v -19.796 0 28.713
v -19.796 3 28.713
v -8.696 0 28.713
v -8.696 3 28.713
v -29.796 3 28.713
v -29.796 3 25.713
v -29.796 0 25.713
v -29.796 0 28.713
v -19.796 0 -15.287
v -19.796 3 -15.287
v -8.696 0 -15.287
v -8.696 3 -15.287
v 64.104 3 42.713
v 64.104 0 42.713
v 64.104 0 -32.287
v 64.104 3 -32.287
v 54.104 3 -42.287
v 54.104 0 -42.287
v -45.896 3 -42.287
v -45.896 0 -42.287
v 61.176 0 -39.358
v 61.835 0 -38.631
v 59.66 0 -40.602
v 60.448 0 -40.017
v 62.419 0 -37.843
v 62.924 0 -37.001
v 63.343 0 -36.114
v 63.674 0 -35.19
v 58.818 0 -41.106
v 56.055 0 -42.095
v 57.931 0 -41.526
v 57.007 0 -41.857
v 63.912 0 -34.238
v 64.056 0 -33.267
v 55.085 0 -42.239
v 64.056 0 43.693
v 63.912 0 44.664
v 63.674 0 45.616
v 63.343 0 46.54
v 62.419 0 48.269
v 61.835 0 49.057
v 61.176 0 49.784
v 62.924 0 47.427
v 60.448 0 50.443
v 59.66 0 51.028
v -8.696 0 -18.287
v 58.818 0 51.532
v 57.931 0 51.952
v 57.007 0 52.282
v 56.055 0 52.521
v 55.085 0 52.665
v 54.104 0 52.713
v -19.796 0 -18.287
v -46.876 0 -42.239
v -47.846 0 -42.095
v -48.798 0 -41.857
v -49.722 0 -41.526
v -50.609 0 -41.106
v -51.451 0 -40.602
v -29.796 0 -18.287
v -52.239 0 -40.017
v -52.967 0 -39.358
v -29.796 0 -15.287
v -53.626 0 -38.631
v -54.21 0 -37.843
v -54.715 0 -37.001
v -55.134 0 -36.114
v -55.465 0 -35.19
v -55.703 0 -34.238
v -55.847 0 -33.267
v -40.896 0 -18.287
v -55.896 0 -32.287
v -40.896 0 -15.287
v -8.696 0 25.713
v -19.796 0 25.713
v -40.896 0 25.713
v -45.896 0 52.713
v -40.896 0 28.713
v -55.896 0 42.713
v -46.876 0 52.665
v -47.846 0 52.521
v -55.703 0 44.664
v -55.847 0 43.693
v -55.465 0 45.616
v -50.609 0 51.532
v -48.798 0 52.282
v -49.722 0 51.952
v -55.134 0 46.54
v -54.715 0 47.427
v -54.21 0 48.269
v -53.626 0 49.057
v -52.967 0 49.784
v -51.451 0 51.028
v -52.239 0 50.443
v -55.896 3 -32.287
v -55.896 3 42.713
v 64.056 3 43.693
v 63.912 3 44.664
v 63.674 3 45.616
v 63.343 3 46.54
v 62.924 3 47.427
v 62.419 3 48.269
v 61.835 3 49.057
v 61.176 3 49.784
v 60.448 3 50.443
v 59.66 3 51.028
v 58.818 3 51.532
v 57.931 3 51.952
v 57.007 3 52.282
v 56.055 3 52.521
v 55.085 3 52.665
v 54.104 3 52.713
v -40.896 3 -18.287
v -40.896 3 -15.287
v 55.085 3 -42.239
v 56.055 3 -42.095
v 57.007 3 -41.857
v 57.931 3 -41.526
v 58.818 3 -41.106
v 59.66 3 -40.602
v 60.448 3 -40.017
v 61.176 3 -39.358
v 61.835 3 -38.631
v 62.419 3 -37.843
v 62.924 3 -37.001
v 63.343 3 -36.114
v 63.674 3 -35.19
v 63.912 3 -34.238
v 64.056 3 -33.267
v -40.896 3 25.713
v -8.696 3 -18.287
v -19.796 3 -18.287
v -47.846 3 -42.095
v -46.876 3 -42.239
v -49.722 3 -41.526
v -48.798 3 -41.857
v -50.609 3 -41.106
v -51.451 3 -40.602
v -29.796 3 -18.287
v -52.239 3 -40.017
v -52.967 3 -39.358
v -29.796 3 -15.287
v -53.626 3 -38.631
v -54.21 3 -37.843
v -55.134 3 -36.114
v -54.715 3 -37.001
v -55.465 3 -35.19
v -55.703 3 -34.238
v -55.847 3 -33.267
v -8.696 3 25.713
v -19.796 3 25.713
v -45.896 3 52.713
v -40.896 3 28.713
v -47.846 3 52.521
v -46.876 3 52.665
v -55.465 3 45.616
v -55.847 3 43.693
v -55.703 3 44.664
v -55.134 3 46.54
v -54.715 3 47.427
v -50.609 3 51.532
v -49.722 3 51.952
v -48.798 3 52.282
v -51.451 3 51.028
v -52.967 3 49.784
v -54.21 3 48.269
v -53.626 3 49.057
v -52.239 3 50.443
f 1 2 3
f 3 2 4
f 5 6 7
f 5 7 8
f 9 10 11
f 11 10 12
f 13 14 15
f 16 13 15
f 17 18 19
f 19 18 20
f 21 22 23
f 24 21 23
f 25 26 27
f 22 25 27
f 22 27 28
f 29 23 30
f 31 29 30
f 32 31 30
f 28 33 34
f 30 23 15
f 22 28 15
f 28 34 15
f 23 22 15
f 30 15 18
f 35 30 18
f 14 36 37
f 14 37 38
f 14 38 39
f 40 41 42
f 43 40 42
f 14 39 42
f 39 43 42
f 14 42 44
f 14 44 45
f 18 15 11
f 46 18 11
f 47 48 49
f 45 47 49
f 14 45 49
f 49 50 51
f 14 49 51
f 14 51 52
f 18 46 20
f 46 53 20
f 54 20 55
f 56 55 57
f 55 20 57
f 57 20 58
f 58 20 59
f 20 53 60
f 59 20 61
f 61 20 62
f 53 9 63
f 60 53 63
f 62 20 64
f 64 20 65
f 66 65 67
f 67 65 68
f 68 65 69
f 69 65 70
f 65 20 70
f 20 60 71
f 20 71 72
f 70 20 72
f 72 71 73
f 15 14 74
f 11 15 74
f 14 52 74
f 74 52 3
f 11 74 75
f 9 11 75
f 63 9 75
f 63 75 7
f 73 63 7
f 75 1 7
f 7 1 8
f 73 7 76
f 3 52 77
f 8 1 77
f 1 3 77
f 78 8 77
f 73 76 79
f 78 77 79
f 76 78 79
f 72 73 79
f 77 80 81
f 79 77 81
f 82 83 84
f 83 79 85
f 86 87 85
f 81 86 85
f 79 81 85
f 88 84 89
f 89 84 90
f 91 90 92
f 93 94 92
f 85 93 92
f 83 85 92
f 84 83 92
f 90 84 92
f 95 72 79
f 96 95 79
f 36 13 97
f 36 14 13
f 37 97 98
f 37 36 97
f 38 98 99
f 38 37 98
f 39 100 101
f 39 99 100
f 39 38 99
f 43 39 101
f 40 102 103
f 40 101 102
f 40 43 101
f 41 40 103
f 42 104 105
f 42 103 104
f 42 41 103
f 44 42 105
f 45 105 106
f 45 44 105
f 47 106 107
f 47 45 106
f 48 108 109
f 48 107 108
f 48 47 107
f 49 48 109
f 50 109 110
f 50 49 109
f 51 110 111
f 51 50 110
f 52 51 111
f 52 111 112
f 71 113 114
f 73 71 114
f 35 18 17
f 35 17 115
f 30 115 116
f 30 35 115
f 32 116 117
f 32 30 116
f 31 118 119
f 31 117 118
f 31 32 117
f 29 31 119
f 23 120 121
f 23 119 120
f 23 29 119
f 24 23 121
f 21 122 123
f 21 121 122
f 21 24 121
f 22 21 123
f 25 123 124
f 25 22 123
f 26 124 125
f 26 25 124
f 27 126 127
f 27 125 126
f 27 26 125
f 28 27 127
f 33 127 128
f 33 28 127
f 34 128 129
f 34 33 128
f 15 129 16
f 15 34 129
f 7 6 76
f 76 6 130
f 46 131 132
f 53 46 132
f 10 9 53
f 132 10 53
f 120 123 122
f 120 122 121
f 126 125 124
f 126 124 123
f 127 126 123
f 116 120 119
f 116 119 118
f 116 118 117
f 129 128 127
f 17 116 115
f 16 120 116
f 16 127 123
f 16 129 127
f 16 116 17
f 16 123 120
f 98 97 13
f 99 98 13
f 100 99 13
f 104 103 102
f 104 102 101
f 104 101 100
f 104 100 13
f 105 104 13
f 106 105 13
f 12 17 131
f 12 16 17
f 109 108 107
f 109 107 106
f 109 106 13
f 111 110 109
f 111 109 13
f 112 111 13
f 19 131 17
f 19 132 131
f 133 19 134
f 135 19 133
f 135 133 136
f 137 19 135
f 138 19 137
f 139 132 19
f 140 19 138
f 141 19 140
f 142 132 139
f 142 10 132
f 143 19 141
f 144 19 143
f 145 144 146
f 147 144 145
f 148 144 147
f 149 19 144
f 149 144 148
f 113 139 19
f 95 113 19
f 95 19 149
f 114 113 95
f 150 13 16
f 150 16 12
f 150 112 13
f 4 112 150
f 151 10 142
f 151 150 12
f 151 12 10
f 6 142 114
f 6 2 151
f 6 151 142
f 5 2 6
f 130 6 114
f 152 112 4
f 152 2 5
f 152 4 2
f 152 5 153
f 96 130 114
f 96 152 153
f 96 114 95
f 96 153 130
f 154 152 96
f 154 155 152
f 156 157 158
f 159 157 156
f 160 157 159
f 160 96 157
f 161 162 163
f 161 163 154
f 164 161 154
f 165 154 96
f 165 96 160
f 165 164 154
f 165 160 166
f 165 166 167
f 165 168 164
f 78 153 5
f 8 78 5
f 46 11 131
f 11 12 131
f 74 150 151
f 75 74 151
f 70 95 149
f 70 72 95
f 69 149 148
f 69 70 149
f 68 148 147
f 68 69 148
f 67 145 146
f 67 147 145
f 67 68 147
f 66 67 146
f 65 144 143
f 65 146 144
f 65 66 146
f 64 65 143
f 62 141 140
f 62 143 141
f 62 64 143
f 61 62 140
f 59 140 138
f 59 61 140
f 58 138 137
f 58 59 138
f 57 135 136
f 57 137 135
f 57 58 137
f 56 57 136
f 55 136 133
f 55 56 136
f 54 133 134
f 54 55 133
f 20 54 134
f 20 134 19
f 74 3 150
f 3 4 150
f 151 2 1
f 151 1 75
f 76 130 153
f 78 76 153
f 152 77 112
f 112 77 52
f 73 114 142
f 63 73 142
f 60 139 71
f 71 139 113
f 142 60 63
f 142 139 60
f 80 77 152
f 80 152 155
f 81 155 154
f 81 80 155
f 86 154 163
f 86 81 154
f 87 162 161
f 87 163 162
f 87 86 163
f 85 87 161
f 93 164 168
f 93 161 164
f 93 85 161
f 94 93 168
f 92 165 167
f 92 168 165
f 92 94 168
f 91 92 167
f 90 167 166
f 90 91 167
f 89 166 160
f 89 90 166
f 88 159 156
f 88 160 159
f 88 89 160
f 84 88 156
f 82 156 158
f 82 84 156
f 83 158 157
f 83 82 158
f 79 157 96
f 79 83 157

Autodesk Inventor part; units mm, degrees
ref_plane "YZ Plane" through (0, 0, 0) normal (1, 0, 0) x (0, 1, 0)
ref_plane "XZ Plane" through (0, 0, 0) normal (0, 1, 0) x (-1, 0, 0)
ref_plane "XY Plane" through (0, 0, 0) normal (0, 0, 1) x (1, 0, 0)
sketch "Sketch1" plane through (0, 0, 0) normal (0, 1, 0) x (-1, 0, 0)
  line L0 (45.8955, 52.7129) -> (-54.1045, 52.7129)
  line L1 (-64.1045, 42.7129) -> (-64.1045, -32.2871)
  line L2 (-54.1045, -42.2871) -> (45.8955, -42.2871)
  line L3 (55.8955, -32.2871) -> (55.8955, 42.7129)
  arc A0 (-64.1045, -32.2871) -> (-54.1045, -42.2871) centre (-54.1045, -32.2871) ccw
  arc A1 (-54.1045, 52.7129) -> (-64.1045, 42.7129) centre (-54.1045, 42.7129) ccw
  arc A2 (55.8955, 42.7129) -> (45.8955, 52.7129) centre (45.8955, 42.7129) ccw
  arc A3 (45.8955, -42.2871) -> (55.8955, -32.2871) centre (45.8955, -32.2871) ccw
  point P0 (0, 0)
  dimension "d0" = 120
  dimension "d1" = 95
  dimension "d4" = 10
extrude "Extrusion2" add sketch "Sketch1" along normal blind 3
sketch "Sketch3" plane through (0, 3, 0) normal (0, 1, 0) x (1, 0, 0)
  line L0 (-40.8955, -28.7129) -> (-8.6955, -28.7129)
  line L1 (-8.6955, -28.7129) -> (-8.6955, -25.7129)
  line L2 (-8.6955, -25.7129) -> (-40.8955, -25.7129)
  line L3 (-40.8955, -25.7129) -> (-40.8955, -28.7129)
  line L4 (-40.8955, 15.2871) -> (-8.6955, 15.2871)
  line L5 (-8.6955, 15.2871) -> (-8.6955, 18.2871)
  line L6 (-8.6955, 18.2871) -> (-40.8955, 18.2871)
  line L7 (-40.8955, 18.2871) -> (-40.8955, 15.2871)
  line L8 (-29.7955, -28.7129) -> (-19.7955, -28.7129)
  line L9 (-19.7955, -28.7129) -> (-19.7955, -25.7129)
  line L10 (-19.7955, -25.7129) -> (-29.7955, -25.7129)
  line L11 (-29.7955, -25.7129) -> (-29.7955, -28.7129)
  line L12 (-29.7955, 15.2871) -> (-19.7955, 15.2871)
  line L13 (-19.7955, 15.2871) -> (-19.7955, 18.2871)
  line L14 (-19.7955, 18.2871) -> (-29.7955, 18.2871)
  line L15 (-29.7955, 18.2871) -> (-29.7955, 15.2871)
  line L16 (-55.8955, 32.2871) -> (-55.8955, -42.7129) projected
  line L17 (-45.8955, -52.7129) -> (54.1045, -52.7129) projected
  line L18 (54.1045, 42.2871) -> (-45.8955, 42.2871) projected
  point P0 (0, 0)
  point P1 (-8.6955, -27.2129)
  point P2 (-8.6955, 16.7871)
  dimension "d7" = 32.2
  dimension "d8" = 3
  dimension "d9" = 32.2
  dimension "d10" = 3
  dimension "d11" = 41
  dimension "d12" = 10
  dimension "d13" = 11.1
  dimension "d14" = 10
  dimension "d15" = 11.1
  dimension "d16" = 15
  dimension "d17" = 24
  dimension "d18" = 95
  dimension "d19" = 24
extrude "Extrusion3" cut sketch "Sketch3" against normal blind 10 contours L3 L2 L11 L0 | L9 L2 L1 L0 | L7 L6 L15 L4 | L13 L6 L5 L4
properties part number "Boden"
